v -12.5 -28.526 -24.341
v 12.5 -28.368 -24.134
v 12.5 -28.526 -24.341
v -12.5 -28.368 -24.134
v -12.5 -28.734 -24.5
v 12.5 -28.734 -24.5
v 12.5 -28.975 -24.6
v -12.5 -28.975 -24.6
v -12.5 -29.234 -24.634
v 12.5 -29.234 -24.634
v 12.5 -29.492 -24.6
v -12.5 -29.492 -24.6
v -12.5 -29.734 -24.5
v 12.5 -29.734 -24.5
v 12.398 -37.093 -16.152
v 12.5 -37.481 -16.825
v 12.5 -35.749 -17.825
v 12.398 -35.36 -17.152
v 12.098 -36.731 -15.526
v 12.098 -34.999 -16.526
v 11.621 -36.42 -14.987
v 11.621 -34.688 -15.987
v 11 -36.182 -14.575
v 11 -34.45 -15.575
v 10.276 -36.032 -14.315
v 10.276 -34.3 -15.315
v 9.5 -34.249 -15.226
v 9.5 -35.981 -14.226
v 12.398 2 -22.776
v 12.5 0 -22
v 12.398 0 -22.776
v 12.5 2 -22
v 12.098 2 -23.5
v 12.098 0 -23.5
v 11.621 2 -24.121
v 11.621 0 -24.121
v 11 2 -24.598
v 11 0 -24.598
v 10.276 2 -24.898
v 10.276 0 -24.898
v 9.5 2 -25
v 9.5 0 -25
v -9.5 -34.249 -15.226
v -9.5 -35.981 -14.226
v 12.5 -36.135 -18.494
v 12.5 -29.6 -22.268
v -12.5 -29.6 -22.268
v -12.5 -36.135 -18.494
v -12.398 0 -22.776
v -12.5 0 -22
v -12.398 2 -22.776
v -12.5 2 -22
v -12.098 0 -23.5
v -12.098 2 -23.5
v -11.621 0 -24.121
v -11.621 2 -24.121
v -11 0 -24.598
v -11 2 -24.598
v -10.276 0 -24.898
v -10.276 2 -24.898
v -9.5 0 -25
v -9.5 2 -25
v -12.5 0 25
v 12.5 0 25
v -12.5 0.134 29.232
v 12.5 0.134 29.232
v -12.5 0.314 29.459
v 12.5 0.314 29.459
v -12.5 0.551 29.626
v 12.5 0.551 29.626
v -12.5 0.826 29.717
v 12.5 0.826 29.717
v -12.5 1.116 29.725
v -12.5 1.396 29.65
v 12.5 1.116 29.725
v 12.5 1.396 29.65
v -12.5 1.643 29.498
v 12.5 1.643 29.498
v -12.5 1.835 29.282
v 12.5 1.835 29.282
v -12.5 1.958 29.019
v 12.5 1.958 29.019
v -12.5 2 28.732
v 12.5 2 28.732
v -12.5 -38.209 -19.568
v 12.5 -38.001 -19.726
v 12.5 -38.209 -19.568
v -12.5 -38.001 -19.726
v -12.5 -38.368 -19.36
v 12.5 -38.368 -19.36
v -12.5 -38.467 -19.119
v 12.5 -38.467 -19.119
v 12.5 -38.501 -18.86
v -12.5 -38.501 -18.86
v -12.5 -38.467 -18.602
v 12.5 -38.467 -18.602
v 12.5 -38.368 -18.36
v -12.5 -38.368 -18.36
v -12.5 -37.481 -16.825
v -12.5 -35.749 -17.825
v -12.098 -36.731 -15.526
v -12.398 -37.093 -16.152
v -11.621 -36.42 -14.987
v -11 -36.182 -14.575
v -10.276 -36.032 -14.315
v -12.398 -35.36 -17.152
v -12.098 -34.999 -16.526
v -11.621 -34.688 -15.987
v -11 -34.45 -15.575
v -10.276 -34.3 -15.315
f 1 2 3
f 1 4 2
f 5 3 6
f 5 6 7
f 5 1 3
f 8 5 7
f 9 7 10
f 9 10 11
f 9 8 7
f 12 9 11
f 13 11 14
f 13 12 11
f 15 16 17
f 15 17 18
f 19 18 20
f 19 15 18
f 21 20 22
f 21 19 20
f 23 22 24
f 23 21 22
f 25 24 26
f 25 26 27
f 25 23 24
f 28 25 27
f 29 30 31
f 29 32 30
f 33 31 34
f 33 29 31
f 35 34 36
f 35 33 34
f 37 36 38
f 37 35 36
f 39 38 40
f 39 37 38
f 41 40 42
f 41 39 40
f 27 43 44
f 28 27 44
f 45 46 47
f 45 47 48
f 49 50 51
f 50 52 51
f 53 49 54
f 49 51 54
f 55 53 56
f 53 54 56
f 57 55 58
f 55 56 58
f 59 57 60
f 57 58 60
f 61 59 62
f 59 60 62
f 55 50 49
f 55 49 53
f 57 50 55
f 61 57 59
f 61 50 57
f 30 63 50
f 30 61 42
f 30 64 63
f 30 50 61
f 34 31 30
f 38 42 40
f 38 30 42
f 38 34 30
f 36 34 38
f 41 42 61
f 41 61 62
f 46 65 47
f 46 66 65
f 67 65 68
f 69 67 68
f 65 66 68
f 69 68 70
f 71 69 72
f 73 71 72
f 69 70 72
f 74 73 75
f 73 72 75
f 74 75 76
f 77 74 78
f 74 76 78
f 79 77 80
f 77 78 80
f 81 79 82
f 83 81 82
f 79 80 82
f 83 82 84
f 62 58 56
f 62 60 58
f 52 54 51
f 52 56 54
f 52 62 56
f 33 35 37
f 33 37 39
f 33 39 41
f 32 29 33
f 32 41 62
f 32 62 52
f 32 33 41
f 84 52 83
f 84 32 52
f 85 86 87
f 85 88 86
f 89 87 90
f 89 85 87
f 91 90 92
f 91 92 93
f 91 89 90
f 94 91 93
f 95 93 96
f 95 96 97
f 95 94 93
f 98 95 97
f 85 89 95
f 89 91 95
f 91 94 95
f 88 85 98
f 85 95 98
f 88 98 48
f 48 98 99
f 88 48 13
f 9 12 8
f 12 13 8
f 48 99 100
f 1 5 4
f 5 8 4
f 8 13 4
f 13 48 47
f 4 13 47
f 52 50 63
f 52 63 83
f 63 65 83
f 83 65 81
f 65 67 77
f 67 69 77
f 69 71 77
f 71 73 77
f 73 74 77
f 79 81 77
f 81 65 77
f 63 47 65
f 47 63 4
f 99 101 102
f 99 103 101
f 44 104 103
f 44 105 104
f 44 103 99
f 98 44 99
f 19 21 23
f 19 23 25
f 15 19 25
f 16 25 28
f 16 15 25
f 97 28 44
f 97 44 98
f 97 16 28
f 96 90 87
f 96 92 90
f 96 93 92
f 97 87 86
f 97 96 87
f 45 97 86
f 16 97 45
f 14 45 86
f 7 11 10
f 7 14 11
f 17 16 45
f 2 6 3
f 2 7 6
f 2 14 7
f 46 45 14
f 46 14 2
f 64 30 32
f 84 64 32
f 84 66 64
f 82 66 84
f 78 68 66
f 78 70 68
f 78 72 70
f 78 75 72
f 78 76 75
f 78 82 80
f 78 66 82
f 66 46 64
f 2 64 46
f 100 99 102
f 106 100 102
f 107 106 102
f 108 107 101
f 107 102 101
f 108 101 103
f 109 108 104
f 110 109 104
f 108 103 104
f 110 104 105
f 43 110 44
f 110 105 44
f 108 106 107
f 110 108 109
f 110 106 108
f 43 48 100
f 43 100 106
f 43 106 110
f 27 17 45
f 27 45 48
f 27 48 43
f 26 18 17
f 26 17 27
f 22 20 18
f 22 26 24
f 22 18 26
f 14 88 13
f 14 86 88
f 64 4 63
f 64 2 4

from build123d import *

# Parameters (mm, degrees)
F1_DEPTH = 12.5
F2_R     = 1
F3_R     = 3


with BuildPart() as f1:
    # F0 (on Right) → F1 (new body, symmetric)
    with BuildSketch(Plane.YZ):
        Polygon((-28.867513, -25), (0, 25), (0, -25), (2, -25), (2, 32.464102), (-29.599564, -22.267949), (-36.135463, -18.494447), (-34.248711, -15.226497), (-35.980762, -14.226497), (-38.867513, -19.226497), align=None)
    extrude(amount=F1_DEPTH, both=True)

    # F2
    f2_edges = [f1.edges().sort_by_distance(p)[0] for p in [
        (0, 2, 32.464102),
        (0, -38.867513, -19.226497),
        (0, -28.867513, -25),
    ]]
    fillet(f2_edges, radius=F2_R)

    # F3
    f3_edges = [f1.edges().sort_by_distance(p)[0] for p in [
        (12.5, 1, -25),
        (-12.5, 1, -25),
        (12.5, -35.114737, -14.726497),
        (-12.5, -35.114737, -14.726497),
    ]]
    fillet(f3_edges, radius=F3_R)


solid = f1.part
